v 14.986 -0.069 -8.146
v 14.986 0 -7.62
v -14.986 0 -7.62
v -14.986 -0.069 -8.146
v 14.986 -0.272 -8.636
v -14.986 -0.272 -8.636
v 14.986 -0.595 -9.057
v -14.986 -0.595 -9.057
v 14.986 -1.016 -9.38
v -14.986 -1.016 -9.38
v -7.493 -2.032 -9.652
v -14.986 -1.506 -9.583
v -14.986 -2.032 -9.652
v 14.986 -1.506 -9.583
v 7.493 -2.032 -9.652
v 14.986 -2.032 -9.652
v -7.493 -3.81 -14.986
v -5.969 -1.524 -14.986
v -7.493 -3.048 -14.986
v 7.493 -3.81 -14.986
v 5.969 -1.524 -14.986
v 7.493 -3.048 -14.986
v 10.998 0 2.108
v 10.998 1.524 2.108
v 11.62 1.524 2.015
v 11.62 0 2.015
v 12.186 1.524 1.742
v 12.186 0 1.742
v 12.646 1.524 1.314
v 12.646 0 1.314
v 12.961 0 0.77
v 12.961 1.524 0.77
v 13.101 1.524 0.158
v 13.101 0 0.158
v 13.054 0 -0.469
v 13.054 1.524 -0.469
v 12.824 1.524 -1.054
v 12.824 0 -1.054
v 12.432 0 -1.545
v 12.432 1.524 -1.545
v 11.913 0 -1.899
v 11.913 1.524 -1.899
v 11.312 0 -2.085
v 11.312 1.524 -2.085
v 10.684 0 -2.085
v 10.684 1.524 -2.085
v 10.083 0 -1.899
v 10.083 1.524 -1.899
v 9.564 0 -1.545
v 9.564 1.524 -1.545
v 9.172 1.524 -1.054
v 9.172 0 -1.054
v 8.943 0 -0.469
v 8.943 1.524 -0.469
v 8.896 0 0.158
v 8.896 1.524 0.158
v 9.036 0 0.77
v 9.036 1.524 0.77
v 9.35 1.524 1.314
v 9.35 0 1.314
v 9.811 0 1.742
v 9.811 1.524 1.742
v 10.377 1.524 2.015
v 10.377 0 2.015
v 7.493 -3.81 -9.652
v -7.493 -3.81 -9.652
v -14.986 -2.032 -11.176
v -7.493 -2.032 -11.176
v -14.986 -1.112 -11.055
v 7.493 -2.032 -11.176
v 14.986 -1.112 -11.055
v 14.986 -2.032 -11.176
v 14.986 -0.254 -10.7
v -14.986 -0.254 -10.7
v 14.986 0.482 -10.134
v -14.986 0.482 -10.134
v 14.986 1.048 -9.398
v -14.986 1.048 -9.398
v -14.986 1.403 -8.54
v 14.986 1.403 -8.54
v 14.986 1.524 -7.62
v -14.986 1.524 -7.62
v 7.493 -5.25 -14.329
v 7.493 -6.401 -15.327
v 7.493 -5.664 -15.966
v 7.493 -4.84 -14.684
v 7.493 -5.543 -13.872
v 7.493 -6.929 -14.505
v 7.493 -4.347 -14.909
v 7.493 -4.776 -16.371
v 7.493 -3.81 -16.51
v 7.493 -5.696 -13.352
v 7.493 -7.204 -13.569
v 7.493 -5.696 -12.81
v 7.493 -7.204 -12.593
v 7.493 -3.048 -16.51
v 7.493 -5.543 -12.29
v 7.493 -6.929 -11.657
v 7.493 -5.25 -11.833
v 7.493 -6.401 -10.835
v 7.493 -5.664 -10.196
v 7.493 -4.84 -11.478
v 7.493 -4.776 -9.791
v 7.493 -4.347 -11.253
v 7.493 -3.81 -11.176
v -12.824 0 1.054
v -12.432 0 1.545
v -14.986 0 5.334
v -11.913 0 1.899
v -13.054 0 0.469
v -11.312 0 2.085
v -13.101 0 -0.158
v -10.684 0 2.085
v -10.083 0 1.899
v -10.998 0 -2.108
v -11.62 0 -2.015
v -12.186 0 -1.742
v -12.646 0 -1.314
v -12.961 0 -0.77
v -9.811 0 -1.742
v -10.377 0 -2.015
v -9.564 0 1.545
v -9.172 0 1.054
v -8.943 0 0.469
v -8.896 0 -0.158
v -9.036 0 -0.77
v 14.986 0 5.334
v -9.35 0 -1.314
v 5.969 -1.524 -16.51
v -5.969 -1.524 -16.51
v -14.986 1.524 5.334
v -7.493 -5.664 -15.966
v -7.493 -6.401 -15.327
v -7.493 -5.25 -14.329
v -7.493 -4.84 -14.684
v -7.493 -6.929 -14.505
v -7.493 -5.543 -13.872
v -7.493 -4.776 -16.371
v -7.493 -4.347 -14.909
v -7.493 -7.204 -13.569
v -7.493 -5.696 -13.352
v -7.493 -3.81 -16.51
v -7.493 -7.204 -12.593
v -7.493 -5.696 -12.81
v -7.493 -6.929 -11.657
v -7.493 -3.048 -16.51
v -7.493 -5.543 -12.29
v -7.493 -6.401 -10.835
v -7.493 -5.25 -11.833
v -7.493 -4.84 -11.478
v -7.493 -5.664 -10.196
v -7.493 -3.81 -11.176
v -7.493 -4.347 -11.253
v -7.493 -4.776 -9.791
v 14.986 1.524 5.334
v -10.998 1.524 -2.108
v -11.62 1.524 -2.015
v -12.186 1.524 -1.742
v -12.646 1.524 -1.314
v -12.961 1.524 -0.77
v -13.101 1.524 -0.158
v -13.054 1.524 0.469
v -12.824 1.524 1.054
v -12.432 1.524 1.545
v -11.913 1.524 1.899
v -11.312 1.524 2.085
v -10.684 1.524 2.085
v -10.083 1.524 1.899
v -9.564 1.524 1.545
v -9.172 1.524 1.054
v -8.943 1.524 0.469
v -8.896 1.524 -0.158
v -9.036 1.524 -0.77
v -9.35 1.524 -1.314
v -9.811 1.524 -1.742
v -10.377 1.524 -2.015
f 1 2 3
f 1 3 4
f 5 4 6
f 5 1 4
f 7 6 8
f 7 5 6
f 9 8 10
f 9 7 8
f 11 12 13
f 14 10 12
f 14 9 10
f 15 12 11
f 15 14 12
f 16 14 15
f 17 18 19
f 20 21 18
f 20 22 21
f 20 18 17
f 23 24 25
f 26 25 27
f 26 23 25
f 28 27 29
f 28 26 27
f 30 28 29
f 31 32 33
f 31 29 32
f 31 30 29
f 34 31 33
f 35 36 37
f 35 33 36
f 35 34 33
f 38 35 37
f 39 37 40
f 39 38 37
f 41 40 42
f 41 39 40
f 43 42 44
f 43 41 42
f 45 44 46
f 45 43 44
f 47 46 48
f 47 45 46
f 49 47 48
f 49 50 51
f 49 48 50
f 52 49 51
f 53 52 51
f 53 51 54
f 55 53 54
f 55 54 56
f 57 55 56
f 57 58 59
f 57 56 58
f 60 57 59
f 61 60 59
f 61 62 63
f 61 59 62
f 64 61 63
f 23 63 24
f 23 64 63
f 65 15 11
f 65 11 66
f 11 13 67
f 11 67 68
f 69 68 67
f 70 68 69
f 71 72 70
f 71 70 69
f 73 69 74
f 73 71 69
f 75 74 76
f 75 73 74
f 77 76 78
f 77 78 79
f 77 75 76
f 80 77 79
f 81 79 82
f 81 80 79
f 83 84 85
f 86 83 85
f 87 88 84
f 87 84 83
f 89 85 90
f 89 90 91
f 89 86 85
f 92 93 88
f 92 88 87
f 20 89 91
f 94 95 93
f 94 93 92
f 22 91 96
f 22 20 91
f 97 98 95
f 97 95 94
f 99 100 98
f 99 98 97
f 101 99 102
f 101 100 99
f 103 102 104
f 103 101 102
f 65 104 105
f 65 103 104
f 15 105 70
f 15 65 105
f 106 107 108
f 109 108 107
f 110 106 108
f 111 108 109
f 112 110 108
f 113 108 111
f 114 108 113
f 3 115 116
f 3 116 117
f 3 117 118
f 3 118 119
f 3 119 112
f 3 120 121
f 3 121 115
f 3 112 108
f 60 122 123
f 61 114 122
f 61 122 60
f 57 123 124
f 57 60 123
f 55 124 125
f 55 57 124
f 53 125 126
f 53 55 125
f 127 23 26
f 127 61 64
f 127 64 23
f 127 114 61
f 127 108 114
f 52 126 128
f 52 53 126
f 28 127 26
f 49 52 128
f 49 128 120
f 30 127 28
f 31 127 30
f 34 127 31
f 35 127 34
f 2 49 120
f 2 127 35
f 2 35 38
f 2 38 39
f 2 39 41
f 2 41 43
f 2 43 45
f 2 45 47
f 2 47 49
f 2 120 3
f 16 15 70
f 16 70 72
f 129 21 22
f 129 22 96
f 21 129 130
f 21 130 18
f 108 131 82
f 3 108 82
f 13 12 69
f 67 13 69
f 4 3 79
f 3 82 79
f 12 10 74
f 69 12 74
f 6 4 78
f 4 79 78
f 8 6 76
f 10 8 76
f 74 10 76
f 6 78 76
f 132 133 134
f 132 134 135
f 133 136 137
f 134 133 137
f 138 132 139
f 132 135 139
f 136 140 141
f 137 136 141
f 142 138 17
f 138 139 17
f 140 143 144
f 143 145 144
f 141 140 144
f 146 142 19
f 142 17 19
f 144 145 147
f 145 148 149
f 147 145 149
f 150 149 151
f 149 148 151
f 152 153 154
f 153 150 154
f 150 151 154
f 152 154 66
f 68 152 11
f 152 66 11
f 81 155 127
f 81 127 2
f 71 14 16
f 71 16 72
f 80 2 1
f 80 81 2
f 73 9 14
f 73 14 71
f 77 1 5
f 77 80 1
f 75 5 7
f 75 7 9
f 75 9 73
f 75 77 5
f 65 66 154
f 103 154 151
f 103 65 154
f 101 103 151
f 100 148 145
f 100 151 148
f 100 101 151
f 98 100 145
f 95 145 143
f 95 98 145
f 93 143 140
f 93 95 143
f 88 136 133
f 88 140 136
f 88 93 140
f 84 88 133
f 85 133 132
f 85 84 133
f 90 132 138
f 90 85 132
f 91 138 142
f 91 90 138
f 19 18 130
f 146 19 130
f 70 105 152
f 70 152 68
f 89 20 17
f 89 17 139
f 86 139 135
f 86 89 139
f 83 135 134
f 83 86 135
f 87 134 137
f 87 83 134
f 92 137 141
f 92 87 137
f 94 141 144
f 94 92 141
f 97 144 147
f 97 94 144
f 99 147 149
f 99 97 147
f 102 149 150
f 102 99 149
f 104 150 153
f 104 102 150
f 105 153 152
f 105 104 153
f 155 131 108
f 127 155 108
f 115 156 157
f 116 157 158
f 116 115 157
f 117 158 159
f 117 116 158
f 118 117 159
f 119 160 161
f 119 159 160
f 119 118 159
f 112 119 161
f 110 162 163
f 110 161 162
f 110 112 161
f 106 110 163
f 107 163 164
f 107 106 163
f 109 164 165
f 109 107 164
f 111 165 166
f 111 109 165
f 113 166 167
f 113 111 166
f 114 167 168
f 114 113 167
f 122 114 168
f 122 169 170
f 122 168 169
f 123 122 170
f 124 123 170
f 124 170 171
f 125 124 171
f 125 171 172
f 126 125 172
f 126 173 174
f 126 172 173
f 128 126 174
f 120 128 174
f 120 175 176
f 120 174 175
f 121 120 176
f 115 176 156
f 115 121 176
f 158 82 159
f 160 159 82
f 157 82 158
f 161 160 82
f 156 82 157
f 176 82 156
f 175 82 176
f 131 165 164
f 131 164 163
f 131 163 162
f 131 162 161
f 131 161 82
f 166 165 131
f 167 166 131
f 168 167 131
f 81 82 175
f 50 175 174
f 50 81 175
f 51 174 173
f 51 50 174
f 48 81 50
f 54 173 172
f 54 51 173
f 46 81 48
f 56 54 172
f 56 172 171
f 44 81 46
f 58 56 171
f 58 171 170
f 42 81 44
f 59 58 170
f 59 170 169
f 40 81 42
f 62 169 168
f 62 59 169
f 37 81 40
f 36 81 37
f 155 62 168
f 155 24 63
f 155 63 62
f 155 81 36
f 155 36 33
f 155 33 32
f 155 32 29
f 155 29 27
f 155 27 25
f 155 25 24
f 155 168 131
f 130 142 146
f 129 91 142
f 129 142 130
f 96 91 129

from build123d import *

# Parameters (mm, degrees)
EXTRUDE1_DEPTH     = 14.986
SKETCH3_W          = 10.126198966
SKETCH3_H          = 9.525984496
CUT_EXTRUDE1_DEPTH = 24.44276897
SKETCH4_W          = 11.338244961
SKETCH4_H          = 6.180272868
SKETCH4_W_2        = 9.014834109
SKETCH4_H_2        = 6.970232558
CUT_EXTRUDE2_DEPTH = 24.44276897
CHAMFER1_SIZE      = 1.524
SKETCH5_R          = 2.1082
CUT_EXTRUDE3_DEPTH = 24.44276897


with BuildPart() as part:
    # Sketch2 → Extrude1 (new, symmetric)
    with BuildSketch(Plane(origin=(0, 0, 0), x_dir=(0, 0, -1), z_dir=(1, 0, 0))):
        with BuildLine():
            Line((-5.334, 0), (7.62, 0))
            ThreePointArc((7.62, 0), (9.056840979, -0.595159021), (9.652, -2.032))
            Line((9.652, -2.032), (9.652, -3.81))
            ThreePointArc((9.652, -3.81), (13.081, -7.239), (16.51, -3.81))
            Line((16.51, -3.81), (16.51, -1.524))
            Line((16.51, -1.524), (14.986, -1.524))
            Line((14.986, -1.524), (14.986, -3.81))
            ThreePointArc((14.986, -3.81), (13.081, -5.715), (11.176, -3.81))
            Line((11.176, -3.81), (11.176, -2.032))
            ThreePointArc((11.176, -2.032), (10.134471714, 0.482471714), (7.62, 1.524))
            Line((7.62, 1.524), (-5.334, 1.524))
            Line((-5.334, 1.524), (-5.334, 0))
        make_face()
    extrude(amount=EXTRUDE1_DEPTH, both=True)

    # Sketch3 → Cut-Extrude1 (cut, through all)
    with BuildSketch(Plane.XY):
        with Locations((-12.556099483, -6.794992248)):
            Rectangle(SKETCH3_W, SKETCH3_H)
        with Locations((12.556099483, -6.794992248)):
            Rectangle(SKETCH3_W, SKETCH3_H)
    extrude(amount=-CUT_EXTRUDE1_DEPTH, mode=Mode.SUBTRACT)

    # Sketch4 → Cut-Extrude2 (cut, through all)
    with BuildSketch(Plane(origin=(0, 0, 0), x_dir=(1, 0, 0), z_dir=(0, 1, 0))):
        with Locations((-13.16212248, 16.740372093)):
            Rectangle(SKETCH4_W, SKETCH4_H)
        with Locations((12.000417055, 16.577733333)):
            Rectangle(SKETCH4_W_2, SKETCH4_H_2)
    extrude(amount=-CUT_EXTRUDE2_DEPTH, mode=Mode.SUBTRACT)

    # Chamfer1
    chamfer1_edges = [part.edges().sort_by_distance(p)[0] for p in [
        (7.493, -1.524, -15.748),
        (-7.493, -1.524, -15.748),
    ]]
    chamfer(chamfer1_edges, length=CHAMFER1_SIZE)

    # Sketch5 → Cut-Extrude3 (cut, through all)
    with BuildSketch(Plane(origin=(0, 0, 0), x_dir=(1, 0, 0), z_dir=(0, 1, 0))):
        with Locations(Location((10.9982, 0, 0), (0, 0, 270))):
            Circle(SKETCH5_R)
        with Locations(Location((-10.9982, 0, 0), (0, 0, 90))):
            Circle(SKETCH5_R)
    extrude(amount=CUT_EXTRUDE3_DEPTH, mode=Mode.SUBTRACT)


solid = part.part
